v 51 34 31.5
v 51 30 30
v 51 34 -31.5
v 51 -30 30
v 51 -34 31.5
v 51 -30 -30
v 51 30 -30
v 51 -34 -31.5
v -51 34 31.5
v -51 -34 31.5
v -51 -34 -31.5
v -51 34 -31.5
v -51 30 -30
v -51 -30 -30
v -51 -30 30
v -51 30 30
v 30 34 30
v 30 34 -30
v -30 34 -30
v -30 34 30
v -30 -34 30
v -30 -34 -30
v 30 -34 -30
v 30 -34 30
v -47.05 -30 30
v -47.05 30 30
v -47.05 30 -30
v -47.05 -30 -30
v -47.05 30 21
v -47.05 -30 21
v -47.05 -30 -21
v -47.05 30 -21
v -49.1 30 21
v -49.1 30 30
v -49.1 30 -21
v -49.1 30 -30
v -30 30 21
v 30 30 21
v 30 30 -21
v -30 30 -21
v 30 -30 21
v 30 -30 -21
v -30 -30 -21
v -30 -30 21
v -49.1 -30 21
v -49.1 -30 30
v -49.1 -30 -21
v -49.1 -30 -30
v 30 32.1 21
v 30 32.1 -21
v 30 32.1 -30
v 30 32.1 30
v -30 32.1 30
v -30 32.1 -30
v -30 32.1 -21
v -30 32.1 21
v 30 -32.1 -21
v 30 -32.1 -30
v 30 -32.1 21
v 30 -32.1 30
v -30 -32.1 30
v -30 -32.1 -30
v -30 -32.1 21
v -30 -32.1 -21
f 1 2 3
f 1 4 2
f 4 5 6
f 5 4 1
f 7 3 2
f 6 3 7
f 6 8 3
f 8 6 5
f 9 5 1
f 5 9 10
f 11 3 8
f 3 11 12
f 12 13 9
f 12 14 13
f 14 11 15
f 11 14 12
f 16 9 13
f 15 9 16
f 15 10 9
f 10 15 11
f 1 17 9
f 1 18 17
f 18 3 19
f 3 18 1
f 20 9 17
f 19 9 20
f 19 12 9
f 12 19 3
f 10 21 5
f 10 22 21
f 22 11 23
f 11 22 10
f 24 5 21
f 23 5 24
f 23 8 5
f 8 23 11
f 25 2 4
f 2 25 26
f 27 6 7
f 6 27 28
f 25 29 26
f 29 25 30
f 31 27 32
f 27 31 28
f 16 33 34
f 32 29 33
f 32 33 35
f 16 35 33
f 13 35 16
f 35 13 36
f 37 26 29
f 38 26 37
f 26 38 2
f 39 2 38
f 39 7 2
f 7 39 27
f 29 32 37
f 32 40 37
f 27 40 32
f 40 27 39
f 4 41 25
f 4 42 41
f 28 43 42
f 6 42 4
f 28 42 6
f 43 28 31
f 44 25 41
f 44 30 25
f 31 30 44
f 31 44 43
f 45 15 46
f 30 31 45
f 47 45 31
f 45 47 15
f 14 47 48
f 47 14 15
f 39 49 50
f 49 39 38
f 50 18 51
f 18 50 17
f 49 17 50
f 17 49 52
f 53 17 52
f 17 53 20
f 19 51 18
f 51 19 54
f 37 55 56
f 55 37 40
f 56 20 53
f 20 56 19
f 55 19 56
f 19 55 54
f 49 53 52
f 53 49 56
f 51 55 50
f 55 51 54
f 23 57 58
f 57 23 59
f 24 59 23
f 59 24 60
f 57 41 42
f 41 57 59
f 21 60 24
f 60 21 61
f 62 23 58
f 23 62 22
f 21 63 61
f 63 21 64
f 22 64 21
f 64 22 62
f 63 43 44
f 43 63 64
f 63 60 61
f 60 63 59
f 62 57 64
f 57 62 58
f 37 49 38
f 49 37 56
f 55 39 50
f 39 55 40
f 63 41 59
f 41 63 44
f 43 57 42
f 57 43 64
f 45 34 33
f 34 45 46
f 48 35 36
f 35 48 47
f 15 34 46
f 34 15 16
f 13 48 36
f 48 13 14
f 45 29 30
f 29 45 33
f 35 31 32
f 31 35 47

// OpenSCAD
difference(){
cube([102,68,63],center=true);
translate([4,0,0]) cube([102.1,60,60],center=true);
translate([-30,32.1,-30])cube([60,2,60]);
translate([-30,-34.1,-30])cube([60,2,60]);
translate([-30,29.7,-21])cube([60,3,42]);
translate([-30,-32.9,-21])cube([60,3,42]);
translate([-51.1,-30,-30])cube([2,60,60]);
translate([-49.15,-30,-21])cube([3,60,42]);
}



/*end comment*/
